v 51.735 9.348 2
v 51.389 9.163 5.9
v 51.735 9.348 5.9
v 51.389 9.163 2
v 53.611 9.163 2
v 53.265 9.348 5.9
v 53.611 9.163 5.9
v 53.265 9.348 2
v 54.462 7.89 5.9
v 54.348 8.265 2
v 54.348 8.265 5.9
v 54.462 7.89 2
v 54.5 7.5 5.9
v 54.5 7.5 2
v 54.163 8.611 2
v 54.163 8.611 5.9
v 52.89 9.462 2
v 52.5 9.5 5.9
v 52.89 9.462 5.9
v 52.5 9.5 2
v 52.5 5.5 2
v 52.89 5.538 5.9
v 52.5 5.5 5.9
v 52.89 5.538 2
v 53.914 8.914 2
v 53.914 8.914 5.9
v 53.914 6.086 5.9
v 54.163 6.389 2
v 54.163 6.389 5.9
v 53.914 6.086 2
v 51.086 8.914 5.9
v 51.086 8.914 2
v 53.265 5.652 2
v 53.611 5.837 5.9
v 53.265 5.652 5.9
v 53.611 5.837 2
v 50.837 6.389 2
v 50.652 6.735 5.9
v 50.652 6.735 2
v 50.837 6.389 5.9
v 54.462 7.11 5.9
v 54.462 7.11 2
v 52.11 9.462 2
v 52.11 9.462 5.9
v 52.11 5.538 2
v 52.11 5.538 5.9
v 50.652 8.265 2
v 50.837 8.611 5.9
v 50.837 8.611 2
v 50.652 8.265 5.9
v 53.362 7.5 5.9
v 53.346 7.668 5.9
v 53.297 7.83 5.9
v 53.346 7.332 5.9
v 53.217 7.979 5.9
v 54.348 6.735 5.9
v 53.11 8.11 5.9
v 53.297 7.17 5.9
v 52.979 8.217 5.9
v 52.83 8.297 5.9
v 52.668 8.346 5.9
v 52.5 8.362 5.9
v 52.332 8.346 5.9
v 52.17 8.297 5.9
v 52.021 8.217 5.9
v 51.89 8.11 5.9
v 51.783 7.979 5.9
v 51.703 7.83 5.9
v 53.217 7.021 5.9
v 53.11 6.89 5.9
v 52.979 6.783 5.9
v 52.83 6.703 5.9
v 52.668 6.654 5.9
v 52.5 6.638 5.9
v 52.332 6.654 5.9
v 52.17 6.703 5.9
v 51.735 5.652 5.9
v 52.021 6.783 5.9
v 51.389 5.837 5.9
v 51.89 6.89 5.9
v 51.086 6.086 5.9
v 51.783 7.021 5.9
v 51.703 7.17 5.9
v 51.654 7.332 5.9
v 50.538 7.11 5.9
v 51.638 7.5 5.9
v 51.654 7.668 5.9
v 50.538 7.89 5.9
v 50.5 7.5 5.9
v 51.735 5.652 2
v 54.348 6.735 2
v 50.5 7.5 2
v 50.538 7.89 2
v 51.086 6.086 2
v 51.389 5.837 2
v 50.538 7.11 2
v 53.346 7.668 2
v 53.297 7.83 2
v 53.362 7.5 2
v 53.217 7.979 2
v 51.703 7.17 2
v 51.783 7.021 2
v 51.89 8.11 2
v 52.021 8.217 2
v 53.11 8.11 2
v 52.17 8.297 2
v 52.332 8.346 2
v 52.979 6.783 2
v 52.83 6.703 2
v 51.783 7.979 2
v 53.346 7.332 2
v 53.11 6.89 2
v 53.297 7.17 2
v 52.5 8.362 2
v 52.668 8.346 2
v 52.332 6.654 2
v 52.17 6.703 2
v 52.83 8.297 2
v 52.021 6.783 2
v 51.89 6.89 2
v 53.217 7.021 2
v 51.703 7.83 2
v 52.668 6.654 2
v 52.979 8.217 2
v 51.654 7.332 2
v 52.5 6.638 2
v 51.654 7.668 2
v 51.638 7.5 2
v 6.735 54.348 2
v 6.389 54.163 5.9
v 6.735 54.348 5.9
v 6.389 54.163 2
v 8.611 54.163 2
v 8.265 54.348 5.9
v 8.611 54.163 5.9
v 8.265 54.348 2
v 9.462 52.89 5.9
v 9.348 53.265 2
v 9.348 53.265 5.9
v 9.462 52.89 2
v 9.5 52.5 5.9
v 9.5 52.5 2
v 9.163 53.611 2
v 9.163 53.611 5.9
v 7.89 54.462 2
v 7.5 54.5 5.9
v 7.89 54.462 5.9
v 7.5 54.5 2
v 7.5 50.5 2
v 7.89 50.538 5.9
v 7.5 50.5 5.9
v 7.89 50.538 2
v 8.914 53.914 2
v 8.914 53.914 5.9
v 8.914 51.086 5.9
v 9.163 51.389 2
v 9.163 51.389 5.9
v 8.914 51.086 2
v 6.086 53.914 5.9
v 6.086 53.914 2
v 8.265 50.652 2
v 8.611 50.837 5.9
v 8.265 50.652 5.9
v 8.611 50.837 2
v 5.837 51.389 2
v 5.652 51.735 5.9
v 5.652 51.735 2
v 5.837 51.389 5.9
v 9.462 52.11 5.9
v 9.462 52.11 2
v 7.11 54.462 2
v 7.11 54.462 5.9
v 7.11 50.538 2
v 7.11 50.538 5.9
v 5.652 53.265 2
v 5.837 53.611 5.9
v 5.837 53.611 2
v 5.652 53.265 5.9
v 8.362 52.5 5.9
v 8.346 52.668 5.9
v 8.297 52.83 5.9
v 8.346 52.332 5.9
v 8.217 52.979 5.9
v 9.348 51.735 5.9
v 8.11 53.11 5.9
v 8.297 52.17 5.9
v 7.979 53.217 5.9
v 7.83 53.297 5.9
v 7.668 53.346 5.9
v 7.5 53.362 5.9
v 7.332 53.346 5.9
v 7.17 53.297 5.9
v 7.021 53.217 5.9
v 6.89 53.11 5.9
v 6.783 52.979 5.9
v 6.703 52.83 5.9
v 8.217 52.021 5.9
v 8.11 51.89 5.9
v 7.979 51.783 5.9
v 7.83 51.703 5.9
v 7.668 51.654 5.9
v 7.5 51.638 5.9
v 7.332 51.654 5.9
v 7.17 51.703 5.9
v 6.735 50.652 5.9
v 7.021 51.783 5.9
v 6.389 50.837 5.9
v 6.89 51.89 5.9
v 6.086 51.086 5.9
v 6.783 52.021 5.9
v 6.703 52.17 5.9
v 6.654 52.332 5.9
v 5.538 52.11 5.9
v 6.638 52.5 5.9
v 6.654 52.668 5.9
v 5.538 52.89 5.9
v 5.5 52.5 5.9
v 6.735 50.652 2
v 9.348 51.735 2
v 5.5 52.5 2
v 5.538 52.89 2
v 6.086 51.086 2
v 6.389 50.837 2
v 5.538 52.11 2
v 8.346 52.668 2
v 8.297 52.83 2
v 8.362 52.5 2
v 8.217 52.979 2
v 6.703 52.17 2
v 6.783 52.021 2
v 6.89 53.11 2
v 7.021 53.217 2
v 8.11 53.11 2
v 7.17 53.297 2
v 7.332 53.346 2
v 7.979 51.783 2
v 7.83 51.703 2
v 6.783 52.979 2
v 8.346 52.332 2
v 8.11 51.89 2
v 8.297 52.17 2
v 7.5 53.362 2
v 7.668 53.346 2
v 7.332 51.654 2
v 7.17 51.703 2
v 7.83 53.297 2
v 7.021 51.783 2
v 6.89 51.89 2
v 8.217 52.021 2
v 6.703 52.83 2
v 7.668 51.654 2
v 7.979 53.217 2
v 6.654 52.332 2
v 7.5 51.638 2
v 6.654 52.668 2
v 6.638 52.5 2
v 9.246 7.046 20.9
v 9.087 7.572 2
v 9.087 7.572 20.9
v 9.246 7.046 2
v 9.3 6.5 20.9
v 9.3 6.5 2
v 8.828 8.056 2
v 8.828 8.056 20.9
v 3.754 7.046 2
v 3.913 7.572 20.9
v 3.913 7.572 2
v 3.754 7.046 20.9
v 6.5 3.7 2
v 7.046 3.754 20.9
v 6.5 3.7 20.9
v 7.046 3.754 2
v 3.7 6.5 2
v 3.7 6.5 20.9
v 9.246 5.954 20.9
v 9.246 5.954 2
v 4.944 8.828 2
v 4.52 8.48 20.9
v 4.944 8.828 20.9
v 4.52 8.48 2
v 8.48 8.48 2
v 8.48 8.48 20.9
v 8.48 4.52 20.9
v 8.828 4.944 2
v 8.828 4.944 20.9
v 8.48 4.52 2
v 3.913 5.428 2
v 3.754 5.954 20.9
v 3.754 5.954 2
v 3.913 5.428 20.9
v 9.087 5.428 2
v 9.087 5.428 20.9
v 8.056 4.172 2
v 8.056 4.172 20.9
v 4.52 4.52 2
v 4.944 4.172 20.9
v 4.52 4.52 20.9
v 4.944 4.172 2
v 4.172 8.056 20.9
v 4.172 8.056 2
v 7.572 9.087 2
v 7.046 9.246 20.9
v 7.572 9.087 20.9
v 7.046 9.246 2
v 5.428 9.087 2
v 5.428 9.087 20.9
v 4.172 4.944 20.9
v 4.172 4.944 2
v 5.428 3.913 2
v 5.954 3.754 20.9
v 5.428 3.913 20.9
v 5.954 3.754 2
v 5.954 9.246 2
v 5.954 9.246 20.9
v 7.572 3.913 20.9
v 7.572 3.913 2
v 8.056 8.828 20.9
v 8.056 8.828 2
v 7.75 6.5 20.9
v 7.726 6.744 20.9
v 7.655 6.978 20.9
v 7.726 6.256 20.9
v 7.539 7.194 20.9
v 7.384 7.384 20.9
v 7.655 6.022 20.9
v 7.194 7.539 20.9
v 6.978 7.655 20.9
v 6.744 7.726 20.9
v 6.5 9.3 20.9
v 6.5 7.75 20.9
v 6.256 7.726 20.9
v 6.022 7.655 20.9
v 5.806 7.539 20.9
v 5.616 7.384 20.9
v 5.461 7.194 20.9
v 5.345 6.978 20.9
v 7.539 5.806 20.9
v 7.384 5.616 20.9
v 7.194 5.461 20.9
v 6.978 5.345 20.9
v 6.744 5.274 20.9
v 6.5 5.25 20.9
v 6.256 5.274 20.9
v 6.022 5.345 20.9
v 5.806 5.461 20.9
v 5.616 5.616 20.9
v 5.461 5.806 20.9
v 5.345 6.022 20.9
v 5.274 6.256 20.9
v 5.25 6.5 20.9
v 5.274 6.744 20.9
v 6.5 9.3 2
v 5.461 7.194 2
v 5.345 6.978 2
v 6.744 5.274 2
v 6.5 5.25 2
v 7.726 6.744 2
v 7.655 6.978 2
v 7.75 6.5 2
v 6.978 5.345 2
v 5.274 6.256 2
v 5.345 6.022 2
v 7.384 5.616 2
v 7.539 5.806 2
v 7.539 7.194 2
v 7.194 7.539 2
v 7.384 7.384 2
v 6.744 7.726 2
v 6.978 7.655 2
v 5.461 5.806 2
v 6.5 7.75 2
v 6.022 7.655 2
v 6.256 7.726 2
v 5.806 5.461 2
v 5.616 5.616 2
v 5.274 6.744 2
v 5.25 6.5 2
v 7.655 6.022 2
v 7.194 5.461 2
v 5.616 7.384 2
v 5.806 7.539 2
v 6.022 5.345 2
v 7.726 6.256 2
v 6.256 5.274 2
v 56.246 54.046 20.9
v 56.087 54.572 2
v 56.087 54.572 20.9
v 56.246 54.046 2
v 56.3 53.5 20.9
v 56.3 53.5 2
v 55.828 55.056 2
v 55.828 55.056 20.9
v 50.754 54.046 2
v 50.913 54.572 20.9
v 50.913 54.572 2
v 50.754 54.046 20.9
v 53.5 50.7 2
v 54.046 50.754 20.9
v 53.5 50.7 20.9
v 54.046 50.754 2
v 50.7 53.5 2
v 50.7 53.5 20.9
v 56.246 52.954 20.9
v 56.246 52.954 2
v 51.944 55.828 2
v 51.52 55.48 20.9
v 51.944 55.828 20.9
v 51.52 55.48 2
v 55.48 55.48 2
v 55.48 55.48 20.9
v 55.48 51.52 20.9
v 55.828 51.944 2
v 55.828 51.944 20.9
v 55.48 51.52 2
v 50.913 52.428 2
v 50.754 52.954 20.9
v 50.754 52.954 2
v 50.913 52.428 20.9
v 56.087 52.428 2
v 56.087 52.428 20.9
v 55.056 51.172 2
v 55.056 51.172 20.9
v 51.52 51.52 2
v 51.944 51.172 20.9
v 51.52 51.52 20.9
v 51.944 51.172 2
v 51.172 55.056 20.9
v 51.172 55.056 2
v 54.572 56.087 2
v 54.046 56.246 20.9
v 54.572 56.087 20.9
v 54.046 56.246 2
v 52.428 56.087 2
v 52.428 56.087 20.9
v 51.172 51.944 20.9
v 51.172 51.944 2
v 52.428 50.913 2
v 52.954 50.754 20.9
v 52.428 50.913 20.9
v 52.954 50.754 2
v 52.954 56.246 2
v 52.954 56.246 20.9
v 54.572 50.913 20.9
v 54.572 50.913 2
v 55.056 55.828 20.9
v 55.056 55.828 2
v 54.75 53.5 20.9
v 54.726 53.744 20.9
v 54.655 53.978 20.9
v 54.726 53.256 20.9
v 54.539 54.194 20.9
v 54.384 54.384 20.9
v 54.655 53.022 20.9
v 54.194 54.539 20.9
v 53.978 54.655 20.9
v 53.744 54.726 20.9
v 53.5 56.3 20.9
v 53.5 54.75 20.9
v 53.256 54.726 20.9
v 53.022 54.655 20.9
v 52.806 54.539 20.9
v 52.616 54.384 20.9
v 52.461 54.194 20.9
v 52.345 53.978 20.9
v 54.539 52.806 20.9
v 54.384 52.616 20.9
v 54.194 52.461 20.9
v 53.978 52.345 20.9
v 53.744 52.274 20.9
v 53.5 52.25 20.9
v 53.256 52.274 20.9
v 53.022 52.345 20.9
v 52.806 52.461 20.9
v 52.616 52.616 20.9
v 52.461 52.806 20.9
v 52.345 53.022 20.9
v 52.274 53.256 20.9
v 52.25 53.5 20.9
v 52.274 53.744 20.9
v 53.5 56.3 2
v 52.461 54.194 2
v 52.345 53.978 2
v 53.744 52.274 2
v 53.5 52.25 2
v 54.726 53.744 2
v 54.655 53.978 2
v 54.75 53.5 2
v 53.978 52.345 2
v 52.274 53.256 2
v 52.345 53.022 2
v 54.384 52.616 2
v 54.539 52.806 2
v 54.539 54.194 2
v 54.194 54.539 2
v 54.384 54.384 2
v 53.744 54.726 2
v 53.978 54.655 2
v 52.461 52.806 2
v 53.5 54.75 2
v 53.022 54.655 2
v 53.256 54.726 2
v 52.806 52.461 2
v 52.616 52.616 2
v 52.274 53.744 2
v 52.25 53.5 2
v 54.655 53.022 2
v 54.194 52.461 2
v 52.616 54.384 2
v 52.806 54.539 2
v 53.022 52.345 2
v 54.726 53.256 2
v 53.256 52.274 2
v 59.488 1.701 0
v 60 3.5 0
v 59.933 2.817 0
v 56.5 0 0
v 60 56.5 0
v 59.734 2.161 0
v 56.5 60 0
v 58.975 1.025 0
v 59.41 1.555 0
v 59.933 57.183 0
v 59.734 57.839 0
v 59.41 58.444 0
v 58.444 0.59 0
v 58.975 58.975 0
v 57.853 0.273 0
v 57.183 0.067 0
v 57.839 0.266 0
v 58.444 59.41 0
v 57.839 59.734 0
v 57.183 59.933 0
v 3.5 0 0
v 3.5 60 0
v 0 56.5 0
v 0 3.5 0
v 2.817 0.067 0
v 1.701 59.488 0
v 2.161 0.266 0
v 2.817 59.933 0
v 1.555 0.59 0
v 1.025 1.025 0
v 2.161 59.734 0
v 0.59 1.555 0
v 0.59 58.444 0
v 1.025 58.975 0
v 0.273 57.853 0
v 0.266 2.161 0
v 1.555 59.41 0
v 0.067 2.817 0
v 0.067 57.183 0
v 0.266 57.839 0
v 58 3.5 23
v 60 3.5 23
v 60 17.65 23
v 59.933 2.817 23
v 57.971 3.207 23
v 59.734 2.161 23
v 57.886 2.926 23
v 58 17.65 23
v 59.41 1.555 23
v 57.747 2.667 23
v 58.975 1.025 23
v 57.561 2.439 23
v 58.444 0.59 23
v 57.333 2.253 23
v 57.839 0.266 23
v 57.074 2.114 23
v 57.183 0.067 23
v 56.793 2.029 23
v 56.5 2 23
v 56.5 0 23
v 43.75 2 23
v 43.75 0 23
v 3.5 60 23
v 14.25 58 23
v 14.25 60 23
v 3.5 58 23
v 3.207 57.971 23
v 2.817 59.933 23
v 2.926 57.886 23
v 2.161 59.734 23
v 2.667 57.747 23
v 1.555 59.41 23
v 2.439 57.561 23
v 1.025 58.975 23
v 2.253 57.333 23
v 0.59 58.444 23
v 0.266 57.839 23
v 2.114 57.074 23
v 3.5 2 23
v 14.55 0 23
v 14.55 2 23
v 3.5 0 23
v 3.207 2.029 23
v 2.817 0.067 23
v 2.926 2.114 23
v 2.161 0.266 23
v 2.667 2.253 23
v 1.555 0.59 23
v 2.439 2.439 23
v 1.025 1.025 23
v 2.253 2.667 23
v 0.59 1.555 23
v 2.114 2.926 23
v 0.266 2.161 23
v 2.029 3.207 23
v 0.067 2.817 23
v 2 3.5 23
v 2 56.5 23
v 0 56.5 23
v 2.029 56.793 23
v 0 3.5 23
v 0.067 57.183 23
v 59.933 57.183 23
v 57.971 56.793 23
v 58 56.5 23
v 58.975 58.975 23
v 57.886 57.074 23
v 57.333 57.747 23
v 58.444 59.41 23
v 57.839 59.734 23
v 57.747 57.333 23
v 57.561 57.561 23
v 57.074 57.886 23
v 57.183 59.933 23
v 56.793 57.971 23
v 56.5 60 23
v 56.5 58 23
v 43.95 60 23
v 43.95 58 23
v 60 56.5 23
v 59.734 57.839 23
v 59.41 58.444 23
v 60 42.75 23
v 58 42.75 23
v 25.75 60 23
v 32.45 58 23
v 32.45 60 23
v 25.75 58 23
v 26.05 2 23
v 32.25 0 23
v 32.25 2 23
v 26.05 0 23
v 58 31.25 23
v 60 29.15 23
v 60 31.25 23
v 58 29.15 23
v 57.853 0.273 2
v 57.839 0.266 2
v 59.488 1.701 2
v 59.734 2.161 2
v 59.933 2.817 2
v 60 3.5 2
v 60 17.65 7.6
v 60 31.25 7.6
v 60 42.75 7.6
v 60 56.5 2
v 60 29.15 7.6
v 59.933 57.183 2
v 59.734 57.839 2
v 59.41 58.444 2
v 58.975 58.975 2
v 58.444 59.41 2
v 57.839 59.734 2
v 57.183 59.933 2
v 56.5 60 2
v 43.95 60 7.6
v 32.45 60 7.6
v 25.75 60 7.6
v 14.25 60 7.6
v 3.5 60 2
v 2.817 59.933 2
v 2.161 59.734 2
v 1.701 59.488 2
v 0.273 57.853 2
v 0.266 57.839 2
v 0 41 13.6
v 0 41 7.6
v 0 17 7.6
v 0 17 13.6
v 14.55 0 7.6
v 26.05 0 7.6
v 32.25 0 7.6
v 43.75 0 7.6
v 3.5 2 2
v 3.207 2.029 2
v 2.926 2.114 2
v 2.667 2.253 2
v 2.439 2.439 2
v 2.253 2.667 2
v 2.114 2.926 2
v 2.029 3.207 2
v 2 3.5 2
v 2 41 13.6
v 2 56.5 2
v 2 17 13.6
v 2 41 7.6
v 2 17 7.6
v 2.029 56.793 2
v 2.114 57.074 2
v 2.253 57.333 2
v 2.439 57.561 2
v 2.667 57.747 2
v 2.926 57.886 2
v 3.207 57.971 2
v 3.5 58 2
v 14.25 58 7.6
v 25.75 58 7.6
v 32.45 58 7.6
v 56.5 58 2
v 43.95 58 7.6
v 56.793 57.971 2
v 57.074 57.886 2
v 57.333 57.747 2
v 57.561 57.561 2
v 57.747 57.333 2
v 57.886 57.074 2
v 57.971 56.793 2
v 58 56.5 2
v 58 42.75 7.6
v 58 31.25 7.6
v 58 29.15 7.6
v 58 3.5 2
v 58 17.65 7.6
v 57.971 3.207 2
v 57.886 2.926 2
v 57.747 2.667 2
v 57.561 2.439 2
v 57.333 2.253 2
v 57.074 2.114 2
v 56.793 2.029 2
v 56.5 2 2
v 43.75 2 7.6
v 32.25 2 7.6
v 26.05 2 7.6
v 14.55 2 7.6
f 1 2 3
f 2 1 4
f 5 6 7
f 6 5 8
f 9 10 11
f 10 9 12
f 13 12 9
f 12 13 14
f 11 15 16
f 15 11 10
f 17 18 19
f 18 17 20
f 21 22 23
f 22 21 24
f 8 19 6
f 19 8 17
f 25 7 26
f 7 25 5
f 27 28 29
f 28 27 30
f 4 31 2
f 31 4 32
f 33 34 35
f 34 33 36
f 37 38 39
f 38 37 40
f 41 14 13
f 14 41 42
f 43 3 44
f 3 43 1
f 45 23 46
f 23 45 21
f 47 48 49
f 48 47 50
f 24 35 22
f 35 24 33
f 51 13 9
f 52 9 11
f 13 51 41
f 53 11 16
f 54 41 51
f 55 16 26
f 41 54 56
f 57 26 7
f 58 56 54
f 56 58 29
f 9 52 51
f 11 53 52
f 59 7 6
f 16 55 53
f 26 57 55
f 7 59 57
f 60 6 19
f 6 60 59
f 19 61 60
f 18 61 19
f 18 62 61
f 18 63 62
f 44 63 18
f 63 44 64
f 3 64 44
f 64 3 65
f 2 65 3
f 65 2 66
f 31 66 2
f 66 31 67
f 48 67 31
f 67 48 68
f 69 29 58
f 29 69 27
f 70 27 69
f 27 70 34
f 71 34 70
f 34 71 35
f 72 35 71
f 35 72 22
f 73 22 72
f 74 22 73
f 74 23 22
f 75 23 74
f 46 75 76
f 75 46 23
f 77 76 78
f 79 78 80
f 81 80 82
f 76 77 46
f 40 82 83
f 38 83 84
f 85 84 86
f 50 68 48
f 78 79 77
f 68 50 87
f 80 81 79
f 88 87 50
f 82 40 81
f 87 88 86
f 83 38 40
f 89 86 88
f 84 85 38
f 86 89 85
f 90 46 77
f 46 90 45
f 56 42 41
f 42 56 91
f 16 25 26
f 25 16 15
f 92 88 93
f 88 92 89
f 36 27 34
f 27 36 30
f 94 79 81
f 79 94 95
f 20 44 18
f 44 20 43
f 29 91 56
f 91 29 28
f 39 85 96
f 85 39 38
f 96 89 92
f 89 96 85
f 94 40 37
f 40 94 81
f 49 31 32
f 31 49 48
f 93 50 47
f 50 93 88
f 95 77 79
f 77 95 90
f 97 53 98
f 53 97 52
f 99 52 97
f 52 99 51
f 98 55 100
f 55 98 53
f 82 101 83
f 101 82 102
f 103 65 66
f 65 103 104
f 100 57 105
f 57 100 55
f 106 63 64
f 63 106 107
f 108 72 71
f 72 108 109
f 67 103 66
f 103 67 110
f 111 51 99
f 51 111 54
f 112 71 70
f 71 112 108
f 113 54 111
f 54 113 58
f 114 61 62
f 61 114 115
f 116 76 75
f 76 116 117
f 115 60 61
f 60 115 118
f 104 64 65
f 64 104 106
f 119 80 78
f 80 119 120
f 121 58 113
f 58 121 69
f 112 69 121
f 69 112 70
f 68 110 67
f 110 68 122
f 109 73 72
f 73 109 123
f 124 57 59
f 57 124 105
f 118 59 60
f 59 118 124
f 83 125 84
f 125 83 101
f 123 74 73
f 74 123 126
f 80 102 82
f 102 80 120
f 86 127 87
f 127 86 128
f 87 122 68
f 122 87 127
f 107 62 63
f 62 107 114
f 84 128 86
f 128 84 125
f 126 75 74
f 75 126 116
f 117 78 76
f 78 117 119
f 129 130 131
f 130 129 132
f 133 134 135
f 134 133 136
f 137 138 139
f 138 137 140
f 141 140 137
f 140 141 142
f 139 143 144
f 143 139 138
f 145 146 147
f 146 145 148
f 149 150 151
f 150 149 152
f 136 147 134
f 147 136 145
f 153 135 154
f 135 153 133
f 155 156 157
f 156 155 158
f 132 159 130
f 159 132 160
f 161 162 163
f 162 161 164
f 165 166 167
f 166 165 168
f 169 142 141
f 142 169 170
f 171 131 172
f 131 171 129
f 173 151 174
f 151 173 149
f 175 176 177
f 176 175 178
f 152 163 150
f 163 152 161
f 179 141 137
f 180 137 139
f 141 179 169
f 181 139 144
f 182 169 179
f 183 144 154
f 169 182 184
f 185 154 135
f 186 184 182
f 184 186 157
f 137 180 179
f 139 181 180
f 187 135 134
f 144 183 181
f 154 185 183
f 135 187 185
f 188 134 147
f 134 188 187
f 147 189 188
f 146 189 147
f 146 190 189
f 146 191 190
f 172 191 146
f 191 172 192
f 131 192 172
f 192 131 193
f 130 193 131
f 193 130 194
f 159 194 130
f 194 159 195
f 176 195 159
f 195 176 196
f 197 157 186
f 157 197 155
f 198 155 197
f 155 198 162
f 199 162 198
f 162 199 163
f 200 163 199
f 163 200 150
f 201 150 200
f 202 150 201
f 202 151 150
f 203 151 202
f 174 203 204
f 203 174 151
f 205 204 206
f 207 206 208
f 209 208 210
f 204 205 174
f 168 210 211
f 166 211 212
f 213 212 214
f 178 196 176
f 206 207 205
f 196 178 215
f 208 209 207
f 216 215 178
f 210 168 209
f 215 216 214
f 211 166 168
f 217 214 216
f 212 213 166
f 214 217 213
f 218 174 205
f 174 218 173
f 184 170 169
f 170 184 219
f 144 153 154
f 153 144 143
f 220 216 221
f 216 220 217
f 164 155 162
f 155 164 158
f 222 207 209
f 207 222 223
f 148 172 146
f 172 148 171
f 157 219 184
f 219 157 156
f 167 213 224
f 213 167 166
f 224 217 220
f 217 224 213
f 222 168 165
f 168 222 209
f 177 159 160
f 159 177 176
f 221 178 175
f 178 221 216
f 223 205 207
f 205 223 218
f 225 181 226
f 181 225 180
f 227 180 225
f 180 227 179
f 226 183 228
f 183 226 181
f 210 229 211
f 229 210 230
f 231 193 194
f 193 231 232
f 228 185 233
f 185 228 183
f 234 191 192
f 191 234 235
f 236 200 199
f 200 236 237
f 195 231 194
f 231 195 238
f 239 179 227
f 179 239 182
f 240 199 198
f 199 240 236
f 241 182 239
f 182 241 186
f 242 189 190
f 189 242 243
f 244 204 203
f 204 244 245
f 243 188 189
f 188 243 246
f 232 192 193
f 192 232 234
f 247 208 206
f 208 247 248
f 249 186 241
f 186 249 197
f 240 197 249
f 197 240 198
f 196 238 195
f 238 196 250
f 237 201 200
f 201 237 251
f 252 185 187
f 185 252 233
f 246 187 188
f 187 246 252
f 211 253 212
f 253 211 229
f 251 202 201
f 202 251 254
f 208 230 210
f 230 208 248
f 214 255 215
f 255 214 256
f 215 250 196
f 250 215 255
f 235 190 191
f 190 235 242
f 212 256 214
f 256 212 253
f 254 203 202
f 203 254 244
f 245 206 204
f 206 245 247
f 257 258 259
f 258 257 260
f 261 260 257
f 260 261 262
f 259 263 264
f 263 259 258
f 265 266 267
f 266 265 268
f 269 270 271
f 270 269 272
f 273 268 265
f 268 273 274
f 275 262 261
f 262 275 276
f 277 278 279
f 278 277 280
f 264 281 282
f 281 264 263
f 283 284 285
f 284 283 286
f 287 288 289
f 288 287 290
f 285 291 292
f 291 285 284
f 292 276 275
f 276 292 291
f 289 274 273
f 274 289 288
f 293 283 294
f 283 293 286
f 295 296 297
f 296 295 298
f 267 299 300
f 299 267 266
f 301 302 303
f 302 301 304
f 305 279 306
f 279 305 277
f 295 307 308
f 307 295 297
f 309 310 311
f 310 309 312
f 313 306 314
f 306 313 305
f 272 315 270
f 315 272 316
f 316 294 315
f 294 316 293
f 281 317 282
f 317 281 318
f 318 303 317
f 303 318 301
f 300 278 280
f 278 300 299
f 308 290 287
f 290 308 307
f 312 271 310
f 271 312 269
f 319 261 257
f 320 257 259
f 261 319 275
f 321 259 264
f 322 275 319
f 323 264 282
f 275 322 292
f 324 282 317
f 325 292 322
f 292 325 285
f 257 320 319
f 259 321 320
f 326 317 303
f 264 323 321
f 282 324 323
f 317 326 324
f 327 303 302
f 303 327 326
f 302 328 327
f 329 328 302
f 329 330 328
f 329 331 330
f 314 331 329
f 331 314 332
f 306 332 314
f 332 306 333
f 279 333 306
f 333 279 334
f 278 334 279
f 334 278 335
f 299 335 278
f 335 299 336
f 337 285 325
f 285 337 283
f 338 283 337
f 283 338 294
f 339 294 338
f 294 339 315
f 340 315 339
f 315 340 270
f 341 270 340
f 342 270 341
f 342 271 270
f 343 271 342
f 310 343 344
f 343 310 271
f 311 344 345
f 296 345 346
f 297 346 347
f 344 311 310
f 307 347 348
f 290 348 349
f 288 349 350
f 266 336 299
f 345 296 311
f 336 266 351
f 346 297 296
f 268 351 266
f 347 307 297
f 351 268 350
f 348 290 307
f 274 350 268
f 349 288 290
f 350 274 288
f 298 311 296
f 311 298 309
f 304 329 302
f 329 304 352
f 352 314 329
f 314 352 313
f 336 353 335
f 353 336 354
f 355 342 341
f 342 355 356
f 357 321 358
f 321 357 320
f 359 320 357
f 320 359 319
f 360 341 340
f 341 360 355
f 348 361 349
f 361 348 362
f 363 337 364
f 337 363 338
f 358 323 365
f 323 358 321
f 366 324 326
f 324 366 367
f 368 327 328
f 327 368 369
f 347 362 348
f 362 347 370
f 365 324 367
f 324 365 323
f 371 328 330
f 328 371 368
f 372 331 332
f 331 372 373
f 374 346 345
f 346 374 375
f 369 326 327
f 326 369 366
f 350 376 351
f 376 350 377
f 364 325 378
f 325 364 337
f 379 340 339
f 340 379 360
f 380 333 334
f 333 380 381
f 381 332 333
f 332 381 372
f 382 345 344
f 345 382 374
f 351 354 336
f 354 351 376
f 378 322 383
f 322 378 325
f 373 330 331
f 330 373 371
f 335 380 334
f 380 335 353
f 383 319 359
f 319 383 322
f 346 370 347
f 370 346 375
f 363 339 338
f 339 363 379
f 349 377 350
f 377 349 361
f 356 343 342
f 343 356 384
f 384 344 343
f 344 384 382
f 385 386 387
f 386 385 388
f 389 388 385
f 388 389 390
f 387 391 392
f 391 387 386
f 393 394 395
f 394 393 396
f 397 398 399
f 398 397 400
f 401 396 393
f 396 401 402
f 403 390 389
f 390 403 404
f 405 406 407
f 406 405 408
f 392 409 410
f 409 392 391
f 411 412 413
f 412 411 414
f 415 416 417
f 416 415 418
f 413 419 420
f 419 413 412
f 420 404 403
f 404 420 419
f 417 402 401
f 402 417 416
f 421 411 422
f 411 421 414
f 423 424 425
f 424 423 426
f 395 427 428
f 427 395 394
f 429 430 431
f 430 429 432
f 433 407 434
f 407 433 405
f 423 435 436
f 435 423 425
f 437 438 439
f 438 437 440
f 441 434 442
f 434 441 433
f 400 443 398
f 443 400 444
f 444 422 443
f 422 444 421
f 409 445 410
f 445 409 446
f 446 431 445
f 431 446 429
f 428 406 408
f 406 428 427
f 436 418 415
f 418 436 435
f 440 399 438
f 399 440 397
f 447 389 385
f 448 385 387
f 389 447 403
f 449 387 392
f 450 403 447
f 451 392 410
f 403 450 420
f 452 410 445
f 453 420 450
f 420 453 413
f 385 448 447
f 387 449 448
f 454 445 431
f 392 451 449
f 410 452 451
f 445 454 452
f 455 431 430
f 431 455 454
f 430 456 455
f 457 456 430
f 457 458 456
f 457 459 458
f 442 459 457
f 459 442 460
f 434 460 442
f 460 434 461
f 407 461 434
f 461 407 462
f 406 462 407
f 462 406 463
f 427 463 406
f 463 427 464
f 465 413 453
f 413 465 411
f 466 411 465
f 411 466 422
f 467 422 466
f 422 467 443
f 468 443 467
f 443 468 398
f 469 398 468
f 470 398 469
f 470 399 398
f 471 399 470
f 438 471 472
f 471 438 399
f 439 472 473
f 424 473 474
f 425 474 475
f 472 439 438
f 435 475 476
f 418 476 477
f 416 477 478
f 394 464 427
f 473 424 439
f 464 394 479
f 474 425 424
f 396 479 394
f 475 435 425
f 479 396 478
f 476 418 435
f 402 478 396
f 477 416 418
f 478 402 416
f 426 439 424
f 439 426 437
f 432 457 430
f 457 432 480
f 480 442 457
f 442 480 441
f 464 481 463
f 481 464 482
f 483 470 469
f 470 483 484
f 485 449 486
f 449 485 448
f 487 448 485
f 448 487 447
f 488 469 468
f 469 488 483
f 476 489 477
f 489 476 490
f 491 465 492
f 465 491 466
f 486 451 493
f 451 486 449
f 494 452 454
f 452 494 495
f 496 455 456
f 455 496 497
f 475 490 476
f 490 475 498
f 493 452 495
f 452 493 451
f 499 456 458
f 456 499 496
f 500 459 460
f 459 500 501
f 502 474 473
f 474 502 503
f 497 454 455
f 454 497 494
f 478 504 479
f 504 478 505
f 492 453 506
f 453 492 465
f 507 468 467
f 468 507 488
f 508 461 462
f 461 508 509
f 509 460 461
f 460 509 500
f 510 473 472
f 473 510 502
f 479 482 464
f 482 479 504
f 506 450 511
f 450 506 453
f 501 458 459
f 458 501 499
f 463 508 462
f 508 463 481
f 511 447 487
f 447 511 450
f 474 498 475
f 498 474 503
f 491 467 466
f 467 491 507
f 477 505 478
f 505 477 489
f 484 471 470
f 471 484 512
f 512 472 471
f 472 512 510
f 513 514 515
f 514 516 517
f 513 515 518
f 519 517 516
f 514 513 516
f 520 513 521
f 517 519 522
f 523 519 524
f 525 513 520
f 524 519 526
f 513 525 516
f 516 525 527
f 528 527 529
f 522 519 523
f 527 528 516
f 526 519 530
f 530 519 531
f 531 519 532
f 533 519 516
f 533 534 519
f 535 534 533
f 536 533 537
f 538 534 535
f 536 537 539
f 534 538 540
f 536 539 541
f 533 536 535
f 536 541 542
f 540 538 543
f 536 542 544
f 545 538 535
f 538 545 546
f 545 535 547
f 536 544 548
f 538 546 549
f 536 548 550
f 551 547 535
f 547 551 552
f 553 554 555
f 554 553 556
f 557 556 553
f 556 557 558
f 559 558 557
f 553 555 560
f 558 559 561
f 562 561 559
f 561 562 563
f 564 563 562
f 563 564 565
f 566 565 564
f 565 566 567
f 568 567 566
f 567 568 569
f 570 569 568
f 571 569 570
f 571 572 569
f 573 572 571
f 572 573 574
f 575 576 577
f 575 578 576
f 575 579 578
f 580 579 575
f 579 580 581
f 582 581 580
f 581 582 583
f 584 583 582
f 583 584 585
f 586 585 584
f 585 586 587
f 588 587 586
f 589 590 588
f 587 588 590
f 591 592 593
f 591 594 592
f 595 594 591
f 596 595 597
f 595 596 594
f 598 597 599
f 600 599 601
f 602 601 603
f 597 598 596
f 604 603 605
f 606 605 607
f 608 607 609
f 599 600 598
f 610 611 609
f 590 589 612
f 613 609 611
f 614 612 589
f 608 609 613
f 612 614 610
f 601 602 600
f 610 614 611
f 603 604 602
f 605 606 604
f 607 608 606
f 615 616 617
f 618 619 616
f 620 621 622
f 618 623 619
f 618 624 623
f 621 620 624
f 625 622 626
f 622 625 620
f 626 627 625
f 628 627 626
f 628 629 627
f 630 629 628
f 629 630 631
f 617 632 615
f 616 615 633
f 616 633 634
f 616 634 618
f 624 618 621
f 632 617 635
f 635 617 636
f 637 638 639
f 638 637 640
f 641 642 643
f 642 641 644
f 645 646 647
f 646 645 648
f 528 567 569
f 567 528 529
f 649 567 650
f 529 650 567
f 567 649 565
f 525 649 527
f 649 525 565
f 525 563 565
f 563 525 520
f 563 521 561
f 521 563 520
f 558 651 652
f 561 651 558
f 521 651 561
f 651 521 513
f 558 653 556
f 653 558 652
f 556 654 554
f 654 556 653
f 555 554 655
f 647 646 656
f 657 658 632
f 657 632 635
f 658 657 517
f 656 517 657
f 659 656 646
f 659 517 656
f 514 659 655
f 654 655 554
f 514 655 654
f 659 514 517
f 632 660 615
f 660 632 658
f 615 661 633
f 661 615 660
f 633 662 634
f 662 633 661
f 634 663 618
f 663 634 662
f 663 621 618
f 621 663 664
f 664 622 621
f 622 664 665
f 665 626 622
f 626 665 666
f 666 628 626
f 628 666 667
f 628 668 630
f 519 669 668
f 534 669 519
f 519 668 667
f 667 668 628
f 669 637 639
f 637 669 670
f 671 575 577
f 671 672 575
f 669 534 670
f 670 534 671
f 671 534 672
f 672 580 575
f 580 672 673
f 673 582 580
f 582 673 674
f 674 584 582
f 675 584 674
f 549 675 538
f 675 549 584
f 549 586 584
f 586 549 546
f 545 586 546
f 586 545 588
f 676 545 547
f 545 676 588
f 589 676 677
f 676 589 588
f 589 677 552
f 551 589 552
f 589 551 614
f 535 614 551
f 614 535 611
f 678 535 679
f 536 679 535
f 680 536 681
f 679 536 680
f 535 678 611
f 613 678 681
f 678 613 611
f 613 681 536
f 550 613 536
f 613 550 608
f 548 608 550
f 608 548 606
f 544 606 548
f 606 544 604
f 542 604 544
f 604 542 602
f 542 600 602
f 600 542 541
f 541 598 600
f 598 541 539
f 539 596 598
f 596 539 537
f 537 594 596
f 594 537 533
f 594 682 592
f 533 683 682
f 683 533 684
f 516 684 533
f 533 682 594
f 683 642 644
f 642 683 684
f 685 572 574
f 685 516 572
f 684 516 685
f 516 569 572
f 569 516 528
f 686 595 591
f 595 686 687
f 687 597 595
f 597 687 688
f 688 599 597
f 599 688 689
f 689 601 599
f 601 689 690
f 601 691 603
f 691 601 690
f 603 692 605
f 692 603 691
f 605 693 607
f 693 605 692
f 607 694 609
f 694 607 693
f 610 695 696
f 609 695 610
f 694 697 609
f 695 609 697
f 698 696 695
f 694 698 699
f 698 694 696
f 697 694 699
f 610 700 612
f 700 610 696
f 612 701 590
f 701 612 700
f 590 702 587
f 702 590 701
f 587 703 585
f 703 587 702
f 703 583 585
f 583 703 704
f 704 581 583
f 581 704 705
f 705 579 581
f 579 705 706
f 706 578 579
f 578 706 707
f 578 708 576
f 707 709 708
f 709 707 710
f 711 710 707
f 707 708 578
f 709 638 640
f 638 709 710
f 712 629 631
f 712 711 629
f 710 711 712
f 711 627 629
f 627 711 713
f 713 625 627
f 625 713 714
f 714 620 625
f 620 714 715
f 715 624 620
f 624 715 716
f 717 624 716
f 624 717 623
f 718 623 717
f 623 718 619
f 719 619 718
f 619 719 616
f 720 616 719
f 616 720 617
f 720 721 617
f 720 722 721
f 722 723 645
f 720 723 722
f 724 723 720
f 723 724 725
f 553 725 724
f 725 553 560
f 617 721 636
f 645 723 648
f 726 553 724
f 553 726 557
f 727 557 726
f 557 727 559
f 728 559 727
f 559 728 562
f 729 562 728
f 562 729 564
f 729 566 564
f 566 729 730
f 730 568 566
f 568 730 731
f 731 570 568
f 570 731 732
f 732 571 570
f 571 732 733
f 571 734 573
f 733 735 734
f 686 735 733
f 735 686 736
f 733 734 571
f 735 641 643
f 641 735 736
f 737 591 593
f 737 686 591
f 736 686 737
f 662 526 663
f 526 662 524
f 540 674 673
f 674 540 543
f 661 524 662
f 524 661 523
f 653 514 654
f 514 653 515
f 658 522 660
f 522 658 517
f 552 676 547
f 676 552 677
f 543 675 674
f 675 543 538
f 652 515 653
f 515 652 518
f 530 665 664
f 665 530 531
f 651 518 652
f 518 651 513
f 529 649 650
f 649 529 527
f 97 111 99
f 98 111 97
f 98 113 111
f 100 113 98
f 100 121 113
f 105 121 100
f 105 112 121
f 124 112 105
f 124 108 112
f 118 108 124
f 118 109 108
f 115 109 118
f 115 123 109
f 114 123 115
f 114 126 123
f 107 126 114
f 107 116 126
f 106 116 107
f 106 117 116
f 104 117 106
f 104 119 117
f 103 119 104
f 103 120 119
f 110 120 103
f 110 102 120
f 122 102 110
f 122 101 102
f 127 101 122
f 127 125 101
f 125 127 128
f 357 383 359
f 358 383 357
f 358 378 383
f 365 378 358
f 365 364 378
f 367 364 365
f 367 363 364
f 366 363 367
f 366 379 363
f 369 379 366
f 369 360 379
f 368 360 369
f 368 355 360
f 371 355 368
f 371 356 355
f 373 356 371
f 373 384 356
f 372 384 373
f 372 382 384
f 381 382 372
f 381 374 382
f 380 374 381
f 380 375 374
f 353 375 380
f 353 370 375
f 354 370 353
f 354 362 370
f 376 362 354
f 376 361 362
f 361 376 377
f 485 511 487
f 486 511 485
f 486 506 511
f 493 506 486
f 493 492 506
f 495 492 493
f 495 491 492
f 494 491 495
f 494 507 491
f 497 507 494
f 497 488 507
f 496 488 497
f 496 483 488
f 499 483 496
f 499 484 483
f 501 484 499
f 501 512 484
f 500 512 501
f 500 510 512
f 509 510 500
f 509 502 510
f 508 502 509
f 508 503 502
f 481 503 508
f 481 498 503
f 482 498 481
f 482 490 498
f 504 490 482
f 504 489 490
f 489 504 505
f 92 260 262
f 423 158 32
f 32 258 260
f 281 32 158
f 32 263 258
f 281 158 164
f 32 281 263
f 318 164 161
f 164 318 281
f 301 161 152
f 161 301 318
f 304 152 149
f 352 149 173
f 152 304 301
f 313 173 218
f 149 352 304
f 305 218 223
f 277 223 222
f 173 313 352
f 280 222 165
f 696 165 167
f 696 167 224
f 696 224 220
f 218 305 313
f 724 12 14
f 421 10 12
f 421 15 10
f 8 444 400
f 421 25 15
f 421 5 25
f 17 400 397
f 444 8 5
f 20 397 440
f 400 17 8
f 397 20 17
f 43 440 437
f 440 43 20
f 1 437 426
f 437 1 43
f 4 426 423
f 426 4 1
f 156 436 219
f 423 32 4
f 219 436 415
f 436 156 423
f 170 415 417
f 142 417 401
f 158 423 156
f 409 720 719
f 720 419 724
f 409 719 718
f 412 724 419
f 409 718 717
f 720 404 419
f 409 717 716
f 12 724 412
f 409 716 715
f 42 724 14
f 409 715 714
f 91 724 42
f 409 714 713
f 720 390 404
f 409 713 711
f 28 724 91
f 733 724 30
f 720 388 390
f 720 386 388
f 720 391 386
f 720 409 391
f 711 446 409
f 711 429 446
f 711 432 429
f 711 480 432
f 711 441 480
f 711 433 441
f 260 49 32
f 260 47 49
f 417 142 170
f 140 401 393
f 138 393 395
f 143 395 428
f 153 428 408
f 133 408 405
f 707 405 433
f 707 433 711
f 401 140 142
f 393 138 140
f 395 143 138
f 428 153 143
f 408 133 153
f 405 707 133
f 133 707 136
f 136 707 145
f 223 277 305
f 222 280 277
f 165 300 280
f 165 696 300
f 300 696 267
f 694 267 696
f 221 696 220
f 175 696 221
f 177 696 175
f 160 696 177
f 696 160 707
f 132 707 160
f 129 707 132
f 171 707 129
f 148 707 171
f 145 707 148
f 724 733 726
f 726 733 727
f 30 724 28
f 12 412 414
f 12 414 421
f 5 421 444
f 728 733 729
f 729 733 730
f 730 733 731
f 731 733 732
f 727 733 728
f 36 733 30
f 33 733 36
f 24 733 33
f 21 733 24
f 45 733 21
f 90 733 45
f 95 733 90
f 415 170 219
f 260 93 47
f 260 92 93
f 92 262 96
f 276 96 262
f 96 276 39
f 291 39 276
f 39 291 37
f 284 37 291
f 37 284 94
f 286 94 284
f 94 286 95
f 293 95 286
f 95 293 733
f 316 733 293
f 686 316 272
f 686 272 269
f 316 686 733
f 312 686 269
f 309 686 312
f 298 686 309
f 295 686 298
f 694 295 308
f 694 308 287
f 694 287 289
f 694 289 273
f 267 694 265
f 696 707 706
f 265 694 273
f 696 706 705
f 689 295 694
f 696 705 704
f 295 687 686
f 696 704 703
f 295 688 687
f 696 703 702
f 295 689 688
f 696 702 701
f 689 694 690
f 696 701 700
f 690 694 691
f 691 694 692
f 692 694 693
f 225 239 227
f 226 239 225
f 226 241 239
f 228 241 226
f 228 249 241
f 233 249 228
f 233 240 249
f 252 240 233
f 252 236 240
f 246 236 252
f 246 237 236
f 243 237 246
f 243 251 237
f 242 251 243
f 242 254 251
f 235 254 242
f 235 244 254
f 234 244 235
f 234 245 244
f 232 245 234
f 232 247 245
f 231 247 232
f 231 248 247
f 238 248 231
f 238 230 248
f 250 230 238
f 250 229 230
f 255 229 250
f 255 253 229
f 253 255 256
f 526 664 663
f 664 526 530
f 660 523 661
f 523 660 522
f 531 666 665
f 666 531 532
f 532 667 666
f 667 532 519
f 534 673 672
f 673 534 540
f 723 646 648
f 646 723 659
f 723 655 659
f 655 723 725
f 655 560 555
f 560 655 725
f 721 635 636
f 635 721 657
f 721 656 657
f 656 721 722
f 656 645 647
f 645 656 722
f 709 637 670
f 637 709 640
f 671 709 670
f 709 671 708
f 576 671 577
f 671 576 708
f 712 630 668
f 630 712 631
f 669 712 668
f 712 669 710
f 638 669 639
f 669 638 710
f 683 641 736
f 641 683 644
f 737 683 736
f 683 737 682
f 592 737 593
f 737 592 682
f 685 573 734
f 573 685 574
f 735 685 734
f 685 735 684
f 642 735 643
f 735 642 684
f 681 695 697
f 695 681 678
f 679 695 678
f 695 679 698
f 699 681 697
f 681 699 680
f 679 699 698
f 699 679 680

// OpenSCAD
//
// Reproduce (more or less) Hammond 1551T enclosure
// for 3D printing
//

$fn = 32;
e = 0.1;

case_out = 60;			/* outer size */
case_in = 56;			/* inner size */
case_ext = 6;			/* height extend beyond stock */
case_hgt = 17+case_ext;		/* box height */

bot_hgt = 2;			/* bottom height (thickness) */

so_dia = 4;			/* board standoff diam */
so_hol = 1.725;			/* board standoff hole diam */
so_hgt = 4;			/* board standoff height above base */
so_xy = 7.5;			/* standoff offset from corner */

out_rad = 3.5;			/* outer corner radius */
in_rad = out_rad-(case_out-case_in)/2; /* inner corner radius */

pcb_thk = 1.6;
pcb_top = so_hgt+bot_hgt+pcb_thk; /* PCB top surface Z */

// RJ cutout dims
rj_wid = 11.5;			/* mfg dim 11.2 */
// rj_hgt = 12.0;			/* mfg dim 11.7 */
rj_hgt = 20.0;			/* mfg dim 11.7 */

// lid support standoff
lid_hgt = 13+case_ext;
lid_dia = 5.6;
lid_hol = 2.5;

// lid support standoff
module lid_at( x, y) {
  translate( [x, y, bot_hgt-e]) {
    difference() {
      cylinder( h=lid_hgt, d=lid_dia);
      cylinder( h=lid_hgt+e, d=lid_hol);
    }
  }
}

// board mount standoff
module standoff_at( x, y) {
  translate( [x, y, bot_hgt-e]) {
    difference() {
      cylinder( h=so_hgt, d=so_dia);
      cylinder( h=so_hgt+e, d=so_hol);
    }
  }
}

module outer_wall() {
    hull() {
      translate( [out_rad, out_rad, 0]) circle( out_rad);
      translate( [case_out-out_rad, case_out-out_rad, 0]) circle( out_rad);
      translate( [out_rad, case_out-out_rad, 0]) circle( out_rad);
      translate( [case_out-out_rad, out_rad, 0]) circle( out_rad);
    }
}

module inner_wall() {
      hull() {
      translate( [in_rad, in_rad, 0]) circle( in_rad);
      translate( [case_in-in_rad, case_in-in_rad, 0]) circle( in_rad);
      translate( [in_rad, case_in-in_rad, 0]) circle( in_rad);
      translate( [case_in-in_rad, in_rad, 0]) circle( in_rad);
    }
}

module case_walls() {
  linear_extrude( height=case_hgt)
    difference() {
    outer_wall();
    translate( [(case_out-case_in)/2, (case_out-case_in)/2, 0])
      inner_wall();
  }
}

// RJ-11 cutout at center (x, y)
module rj11_at( x, y) {
  translate( [x, y, pcb_top])
    translate( [-rj_wid/2, -5, 0])
    cube( [rj_wid, 10, rj_hgt]);
}

// 26 pin ribbon cutout dims
rib_wid = 24.0;			/* mfg dim 22.9 */
rib_hgt = 6.0;			/* mfg dim 5.0 */

// ribbon cutout at center (x, y);
module rib_at( x, y) {
  translate( [x, y, pcb_top])
    translate( [-rib_wid/2, -5, 0])
    cube( [rib_wid, 10, rib_hgt]);
}

// model the box
module box() {
  case_walls();			/* walls with radius */
  linear_extrude( height=bot_hgt) outer_wall(); /* bottom */
  standoff_at( case_out-so_xy, so_xy);
  standoff_at( so_xy, case_out-so_xy);
  lid_at( case_out-so_xy-46, so_xy-1);
  lid_at( so_xy+46, case_out-so_xy+1);
}

difference() {
  box();
  // top RJ-11
  rj11_at( so_xy+12.5, case_out);
  rj11_at( so_xy+30.7, case_out);
  // bottom RJ-11
  rj11_at( so_xy+12.8, 0);
  rj11_at( so_xy+30.5, 0);
  // right RJ-11
  rotate( [0, 0, 90]) {
    rj11_at( so_xy+15.9, -case_out);
    rj11_at( so_xy+29.5, -case_out);
  }
  rotate( [0, 0, 90]) {
    rib_at( case_out-so_xy-23.5, 0);
  }
}
